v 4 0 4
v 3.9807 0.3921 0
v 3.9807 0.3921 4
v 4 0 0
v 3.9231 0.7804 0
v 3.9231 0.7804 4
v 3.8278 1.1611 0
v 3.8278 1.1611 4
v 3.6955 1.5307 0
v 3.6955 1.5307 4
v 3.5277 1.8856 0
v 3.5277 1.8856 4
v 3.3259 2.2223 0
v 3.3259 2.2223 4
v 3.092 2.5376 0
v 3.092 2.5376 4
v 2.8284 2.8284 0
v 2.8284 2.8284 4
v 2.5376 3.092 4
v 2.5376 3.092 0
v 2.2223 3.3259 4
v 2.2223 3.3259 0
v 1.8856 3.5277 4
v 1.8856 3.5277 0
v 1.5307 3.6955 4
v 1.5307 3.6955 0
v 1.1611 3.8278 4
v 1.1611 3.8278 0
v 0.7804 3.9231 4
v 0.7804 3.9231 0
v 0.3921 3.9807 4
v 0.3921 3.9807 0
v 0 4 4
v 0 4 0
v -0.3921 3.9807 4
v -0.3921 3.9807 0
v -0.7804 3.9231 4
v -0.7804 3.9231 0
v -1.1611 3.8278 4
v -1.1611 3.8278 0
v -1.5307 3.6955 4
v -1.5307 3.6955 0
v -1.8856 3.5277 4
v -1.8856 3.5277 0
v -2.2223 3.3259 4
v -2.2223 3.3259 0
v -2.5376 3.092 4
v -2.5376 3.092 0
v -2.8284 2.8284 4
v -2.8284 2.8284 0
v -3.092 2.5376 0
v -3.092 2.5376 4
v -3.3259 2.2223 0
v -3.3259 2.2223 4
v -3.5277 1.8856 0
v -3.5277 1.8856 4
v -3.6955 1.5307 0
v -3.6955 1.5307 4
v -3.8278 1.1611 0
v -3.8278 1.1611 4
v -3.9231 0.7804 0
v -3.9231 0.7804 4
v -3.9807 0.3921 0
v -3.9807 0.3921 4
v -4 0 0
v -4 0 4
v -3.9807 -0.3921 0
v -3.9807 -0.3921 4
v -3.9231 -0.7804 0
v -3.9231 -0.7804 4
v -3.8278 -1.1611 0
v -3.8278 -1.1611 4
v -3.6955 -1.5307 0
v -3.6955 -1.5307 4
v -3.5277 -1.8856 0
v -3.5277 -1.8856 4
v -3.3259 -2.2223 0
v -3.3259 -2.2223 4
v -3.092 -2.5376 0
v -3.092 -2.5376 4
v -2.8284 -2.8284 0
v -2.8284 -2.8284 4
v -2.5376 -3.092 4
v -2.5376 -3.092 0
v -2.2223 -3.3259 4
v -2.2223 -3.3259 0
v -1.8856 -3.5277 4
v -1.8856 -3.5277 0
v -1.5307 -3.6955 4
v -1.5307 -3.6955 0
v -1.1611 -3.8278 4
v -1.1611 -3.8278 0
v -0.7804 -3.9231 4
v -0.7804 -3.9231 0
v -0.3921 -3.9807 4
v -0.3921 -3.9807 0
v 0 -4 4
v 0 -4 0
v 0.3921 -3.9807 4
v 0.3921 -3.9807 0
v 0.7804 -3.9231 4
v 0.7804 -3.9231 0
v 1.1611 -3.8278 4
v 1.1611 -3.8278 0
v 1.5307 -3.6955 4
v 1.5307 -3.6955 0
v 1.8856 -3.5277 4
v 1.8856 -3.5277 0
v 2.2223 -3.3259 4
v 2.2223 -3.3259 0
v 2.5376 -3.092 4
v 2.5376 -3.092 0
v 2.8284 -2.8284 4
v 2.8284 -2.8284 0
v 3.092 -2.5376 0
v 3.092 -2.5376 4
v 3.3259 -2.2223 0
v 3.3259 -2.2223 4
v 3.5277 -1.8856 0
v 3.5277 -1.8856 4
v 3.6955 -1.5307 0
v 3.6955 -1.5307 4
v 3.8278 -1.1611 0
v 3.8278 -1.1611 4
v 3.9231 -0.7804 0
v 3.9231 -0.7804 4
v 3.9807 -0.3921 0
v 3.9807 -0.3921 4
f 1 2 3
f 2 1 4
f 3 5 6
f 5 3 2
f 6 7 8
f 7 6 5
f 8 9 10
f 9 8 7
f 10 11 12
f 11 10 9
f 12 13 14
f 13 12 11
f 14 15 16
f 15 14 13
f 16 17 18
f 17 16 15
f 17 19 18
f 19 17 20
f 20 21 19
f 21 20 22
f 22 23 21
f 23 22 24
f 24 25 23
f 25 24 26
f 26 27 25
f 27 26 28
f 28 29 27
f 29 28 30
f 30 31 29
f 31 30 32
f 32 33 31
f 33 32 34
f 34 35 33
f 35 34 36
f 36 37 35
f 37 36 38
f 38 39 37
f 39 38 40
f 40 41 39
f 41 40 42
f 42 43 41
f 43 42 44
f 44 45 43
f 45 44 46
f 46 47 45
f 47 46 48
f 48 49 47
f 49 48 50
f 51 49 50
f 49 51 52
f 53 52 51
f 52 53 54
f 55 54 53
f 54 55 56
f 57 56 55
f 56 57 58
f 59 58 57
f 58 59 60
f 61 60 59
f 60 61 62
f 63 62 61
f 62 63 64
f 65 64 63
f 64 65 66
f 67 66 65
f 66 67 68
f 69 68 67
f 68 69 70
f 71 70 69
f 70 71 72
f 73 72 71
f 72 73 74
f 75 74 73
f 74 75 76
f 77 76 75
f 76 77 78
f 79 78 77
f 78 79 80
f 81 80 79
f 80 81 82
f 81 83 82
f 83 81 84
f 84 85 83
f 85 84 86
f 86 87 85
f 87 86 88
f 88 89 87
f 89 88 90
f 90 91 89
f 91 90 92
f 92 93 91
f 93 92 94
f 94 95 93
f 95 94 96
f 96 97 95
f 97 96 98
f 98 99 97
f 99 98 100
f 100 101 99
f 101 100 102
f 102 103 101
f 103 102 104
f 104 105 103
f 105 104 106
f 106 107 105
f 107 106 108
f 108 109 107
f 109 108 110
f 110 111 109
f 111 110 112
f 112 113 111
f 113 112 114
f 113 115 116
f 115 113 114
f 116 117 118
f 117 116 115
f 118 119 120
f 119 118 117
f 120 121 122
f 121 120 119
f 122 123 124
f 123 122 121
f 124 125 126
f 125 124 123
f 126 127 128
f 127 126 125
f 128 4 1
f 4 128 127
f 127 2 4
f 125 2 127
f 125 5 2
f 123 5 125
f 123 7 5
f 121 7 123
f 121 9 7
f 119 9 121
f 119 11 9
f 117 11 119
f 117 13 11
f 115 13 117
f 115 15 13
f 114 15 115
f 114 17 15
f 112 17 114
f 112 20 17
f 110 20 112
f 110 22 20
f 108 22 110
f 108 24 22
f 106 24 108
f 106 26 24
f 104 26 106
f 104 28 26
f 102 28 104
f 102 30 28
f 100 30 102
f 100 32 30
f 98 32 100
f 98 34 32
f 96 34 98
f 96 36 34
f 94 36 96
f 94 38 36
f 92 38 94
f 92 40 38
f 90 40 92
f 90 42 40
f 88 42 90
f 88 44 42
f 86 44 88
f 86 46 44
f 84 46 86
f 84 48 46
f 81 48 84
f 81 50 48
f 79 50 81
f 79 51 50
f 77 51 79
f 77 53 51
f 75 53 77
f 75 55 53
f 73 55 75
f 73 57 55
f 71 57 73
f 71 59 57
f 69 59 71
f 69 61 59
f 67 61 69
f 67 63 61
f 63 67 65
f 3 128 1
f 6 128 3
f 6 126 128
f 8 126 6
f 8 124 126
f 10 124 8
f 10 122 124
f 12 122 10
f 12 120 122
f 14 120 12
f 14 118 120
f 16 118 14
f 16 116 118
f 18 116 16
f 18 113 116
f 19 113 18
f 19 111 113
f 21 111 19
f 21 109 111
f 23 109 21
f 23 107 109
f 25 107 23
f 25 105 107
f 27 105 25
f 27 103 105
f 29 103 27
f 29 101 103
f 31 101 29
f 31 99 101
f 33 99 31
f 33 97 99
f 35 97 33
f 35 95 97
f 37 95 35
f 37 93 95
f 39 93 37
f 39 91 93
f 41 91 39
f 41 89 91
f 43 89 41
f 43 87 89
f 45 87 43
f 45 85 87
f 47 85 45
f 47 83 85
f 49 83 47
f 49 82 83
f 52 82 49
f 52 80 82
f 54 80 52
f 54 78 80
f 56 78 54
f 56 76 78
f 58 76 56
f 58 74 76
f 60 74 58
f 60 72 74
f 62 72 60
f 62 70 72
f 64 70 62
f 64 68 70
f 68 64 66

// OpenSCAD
*group() {
  h = 2.8;
  o = 4;
  i = 5;
  fn = 16;

  difference() {
    cylinder(h, o, i + .4, $fn = fn);
    translate([0, 0, .28 * 2]) 
      cylinder(h - .28 * 1.9, o - (.28*4), i - (.28*4), $fn = fn);
  }

  translate([0,0, h])
  difference() {
    sphere(i, $fn = fn);
    scale([.75, .75, .75]) sphere(i, $fn = fn);
    translate([0, 0, i * -1.5]) cube(i * 3, center = true);
    translate([0, 0, i * 1.5])
      sphere(i, $fn = fn);
  }
}

cylinder(4, 4, 4, $fn = 64);
